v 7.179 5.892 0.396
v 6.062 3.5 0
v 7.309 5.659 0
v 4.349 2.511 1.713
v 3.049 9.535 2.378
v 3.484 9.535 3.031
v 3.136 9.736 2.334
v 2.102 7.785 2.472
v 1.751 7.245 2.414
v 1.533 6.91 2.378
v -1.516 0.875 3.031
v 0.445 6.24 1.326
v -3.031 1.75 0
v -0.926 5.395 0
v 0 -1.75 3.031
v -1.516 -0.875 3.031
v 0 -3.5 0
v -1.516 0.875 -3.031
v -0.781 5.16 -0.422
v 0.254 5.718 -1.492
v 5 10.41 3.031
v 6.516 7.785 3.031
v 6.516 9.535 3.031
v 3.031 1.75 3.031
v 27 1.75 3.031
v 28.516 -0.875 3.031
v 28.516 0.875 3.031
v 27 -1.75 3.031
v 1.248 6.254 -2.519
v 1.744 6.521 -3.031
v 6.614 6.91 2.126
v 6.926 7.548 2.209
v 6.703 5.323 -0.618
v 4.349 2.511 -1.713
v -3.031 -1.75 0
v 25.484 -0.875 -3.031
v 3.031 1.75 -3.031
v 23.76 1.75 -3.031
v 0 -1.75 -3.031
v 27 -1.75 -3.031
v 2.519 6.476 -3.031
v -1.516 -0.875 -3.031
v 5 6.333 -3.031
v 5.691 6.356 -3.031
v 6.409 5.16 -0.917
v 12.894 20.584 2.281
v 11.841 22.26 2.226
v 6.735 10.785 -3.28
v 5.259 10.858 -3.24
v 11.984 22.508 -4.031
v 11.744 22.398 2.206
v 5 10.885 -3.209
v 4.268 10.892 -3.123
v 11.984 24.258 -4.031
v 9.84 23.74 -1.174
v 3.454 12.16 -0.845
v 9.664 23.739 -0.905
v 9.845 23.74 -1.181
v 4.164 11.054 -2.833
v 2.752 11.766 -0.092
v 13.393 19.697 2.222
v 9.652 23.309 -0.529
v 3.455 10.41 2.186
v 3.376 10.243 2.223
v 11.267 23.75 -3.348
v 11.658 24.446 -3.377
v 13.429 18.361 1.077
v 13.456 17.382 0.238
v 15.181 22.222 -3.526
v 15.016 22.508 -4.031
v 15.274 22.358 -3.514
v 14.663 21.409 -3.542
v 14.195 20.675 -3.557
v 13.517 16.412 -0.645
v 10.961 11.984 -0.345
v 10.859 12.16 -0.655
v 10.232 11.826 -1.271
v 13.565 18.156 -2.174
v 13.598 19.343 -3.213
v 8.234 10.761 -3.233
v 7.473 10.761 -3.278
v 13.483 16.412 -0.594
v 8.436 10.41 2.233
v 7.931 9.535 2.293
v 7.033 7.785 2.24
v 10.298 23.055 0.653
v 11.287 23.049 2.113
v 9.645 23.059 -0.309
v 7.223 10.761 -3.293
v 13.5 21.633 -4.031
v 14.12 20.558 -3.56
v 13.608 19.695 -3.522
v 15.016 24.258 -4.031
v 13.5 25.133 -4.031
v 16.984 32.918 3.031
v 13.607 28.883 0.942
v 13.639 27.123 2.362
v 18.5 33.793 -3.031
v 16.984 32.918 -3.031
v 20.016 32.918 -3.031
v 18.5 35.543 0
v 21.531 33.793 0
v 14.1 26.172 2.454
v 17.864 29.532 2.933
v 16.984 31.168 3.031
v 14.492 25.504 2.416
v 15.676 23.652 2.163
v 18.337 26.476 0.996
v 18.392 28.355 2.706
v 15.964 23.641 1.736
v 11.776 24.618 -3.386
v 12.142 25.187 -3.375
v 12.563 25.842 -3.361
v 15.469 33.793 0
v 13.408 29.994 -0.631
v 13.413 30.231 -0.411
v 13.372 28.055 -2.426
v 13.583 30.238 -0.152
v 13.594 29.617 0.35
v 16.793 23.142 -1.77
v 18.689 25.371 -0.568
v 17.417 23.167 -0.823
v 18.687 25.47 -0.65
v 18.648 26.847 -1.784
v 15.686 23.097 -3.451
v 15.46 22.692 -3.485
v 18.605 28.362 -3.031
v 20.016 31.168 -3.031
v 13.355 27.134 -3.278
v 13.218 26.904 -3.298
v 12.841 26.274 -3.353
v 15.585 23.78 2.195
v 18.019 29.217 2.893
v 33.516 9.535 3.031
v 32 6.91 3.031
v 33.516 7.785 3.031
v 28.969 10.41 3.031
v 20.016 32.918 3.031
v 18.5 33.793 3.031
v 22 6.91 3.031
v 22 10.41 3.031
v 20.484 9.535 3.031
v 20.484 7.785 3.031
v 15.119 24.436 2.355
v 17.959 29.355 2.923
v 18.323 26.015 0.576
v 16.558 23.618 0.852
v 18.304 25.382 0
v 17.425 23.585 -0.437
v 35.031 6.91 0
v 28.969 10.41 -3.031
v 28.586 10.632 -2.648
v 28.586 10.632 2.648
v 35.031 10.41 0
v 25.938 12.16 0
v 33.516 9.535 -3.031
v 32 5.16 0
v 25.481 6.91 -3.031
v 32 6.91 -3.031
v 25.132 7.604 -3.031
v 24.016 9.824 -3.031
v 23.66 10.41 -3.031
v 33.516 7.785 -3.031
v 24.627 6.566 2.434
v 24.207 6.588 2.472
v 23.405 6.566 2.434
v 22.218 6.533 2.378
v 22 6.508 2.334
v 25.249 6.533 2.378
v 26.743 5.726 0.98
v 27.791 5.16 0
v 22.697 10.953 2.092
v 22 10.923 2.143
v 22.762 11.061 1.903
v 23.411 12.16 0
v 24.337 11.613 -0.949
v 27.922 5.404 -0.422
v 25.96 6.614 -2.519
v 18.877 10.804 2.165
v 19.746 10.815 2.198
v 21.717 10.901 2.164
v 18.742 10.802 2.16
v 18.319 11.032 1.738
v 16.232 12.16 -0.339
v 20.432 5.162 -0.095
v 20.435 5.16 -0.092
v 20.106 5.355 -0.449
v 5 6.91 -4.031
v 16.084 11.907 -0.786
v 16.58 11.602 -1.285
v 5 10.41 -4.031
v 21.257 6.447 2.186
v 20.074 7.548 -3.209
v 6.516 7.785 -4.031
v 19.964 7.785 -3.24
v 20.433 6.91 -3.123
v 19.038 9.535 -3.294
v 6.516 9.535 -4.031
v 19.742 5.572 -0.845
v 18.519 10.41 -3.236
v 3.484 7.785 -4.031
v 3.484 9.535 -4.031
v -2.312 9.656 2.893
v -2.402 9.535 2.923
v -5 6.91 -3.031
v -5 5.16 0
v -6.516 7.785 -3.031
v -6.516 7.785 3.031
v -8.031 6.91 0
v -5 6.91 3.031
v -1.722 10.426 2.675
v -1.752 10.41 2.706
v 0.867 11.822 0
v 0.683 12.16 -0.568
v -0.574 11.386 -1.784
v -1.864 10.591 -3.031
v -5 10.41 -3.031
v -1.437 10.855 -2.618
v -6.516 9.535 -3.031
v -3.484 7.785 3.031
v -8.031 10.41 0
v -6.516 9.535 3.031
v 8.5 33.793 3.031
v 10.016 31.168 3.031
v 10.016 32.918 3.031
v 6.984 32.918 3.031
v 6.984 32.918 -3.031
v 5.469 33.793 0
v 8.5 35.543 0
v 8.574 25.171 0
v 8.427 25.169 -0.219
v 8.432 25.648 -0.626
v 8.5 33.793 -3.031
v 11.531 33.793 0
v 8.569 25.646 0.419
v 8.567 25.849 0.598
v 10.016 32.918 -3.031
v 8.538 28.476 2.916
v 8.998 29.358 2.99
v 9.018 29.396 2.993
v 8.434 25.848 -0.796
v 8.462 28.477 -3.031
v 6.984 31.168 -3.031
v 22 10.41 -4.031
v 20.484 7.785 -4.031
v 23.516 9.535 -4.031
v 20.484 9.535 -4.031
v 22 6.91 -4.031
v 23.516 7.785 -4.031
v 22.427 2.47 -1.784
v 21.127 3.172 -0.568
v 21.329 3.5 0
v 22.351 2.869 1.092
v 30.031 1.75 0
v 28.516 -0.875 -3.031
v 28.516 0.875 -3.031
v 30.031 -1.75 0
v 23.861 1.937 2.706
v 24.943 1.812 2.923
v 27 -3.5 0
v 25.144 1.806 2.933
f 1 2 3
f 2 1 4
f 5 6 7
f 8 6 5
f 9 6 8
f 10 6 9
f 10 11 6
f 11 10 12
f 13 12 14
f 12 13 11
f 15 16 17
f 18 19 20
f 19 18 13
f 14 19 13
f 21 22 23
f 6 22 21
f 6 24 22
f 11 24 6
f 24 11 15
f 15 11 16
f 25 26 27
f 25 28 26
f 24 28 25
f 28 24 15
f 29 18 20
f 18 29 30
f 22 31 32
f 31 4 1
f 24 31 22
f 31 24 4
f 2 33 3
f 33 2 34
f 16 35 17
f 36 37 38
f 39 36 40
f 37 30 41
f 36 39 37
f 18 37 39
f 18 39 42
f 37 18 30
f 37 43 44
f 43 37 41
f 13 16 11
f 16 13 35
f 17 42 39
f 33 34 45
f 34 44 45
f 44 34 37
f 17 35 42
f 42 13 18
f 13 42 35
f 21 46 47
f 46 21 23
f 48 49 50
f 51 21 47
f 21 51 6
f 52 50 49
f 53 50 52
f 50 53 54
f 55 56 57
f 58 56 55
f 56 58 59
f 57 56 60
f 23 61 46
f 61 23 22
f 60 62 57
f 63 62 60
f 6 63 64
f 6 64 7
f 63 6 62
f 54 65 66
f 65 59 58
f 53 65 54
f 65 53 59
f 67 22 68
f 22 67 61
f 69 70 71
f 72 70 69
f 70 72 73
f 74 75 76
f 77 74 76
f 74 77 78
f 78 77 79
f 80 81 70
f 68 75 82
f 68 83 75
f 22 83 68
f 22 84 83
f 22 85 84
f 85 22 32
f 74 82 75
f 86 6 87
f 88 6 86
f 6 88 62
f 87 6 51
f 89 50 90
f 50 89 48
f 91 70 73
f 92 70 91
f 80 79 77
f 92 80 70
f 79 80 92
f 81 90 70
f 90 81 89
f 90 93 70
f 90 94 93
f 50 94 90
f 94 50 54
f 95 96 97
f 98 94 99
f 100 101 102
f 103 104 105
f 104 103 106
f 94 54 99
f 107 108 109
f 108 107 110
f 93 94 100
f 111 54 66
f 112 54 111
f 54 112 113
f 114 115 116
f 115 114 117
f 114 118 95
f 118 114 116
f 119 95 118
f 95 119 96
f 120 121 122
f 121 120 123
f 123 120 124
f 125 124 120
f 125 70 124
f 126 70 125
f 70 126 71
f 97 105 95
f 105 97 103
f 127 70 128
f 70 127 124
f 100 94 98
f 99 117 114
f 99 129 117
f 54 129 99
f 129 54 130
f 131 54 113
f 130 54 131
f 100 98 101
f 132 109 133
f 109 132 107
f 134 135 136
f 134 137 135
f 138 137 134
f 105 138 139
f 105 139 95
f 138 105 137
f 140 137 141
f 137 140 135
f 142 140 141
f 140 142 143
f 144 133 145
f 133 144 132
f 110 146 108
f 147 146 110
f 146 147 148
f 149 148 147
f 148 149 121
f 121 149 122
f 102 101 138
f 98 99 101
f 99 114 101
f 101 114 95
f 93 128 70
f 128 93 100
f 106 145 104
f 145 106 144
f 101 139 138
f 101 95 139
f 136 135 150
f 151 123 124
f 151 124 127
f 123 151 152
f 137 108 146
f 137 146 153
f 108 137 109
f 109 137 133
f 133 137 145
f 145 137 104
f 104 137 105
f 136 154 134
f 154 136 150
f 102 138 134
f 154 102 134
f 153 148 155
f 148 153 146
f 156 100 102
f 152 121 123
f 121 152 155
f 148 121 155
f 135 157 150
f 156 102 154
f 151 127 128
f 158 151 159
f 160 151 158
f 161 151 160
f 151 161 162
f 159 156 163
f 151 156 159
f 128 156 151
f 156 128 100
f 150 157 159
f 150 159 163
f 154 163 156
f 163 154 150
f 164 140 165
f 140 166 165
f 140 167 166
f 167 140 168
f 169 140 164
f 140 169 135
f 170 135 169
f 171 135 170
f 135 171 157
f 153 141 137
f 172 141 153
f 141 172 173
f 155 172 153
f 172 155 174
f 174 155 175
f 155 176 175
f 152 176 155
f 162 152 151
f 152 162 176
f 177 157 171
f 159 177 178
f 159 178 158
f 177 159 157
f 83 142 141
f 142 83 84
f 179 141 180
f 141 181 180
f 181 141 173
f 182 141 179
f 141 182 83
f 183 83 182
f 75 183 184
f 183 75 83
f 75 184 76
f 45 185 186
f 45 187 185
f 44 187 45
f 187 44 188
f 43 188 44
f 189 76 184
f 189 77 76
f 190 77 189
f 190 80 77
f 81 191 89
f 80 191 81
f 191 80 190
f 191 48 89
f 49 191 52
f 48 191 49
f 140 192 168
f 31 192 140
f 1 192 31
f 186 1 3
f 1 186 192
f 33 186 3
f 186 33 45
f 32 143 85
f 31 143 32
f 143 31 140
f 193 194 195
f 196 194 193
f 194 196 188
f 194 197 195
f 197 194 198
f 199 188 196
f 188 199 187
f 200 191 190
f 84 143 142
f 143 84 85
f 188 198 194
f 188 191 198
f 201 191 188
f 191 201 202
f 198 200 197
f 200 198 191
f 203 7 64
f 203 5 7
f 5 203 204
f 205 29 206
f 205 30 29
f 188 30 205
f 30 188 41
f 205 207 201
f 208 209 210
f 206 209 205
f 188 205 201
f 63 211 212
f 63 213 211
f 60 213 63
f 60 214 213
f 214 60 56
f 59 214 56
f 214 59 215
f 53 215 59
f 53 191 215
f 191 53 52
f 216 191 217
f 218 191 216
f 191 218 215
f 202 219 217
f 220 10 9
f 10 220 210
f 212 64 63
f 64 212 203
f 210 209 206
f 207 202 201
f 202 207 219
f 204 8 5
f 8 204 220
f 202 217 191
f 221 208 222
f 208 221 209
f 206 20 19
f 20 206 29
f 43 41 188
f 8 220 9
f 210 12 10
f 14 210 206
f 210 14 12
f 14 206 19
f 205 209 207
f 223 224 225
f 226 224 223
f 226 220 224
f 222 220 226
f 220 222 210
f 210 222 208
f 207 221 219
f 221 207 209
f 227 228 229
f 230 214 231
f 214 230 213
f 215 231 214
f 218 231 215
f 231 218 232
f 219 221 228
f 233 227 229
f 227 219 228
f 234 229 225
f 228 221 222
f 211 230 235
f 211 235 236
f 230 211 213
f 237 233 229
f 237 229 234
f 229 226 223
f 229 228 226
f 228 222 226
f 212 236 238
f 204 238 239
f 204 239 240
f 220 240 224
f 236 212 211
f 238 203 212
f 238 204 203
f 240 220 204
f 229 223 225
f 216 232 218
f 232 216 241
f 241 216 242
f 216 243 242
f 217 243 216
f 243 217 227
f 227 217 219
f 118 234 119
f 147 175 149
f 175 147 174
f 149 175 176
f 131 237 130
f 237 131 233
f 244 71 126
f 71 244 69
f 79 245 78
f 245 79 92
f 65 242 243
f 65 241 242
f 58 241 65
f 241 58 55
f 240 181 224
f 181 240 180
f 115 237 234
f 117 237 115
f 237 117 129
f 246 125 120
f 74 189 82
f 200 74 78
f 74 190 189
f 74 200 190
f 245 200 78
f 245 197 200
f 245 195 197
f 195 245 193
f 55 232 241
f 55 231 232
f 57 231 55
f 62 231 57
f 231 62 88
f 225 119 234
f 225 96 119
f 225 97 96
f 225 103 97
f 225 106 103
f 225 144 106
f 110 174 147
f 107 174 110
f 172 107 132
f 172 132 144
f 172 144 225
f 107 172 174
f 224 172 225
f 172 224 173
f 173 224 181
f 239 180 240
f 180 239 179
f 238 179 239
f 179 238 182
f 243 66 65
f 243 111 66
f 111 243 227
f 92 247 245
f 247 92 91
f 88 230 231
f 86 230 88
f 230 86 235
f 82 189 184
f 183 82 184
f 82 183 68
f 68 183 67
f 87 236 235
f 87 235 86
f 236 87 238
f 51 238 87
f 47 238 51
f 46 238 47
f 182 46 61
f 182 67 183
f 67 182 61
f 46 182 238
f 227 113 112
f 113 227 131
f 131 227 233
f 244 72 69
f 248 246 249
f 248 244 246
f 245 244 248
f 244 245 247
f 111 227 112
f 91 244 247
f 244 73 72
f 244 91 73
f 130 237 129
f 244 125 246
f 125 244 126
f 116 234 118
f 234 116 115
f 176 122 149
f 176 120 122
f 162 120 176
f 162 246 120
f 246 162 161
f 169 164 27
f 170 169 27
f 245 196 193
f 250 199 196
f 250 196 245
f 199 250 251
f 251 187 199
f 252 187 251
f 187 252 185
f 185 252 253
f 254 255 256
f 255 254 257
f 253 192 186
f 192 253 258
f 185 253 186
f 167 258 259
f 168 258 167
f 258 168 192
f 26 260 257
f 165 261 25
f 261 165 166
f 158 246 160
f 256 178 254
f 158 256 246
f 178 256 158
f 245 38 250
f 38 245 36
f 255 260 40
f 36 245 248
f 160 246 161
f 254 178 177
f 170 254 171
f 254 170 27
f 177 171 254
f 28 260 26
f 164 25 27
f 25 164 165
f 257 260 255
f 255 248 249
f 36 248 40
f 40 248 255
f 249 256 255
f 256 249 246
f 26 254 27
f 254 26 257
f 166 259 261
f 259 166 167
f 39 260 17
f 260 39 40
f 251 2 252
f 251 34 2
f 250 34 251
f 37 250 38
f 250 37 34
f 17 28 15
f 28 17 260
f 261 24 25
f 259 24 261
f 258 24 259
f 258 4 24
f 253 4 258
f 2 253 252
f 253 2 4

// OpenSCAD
scale(v = 10) {
	union() {
		hull() {
			translate(v = [0.0000000000, 0.0, 0]) {
				rotate(a = [0, 0, 30]) {
					sphere($fn = 6, r = 0.3500000000);
				}
			}
			translate(v = [0.5000000000, 0.8660254037844386, 0]) {
				rotate(a = [0, 0, 30]) {
					sphere($fn = 6, r = 0.3500000000);
				}
			}
		}
		hull() {
			translate(v = [0.5000000000, 0.8660254037844386, 0]) {
				rotate(a = [0, 0, 30]) {
					sphere($fn = 6, r = 0.3500000000);
				}
			}
			translate(v = [1.3500000000, 2.3382685902179845, -0.1000000000]) {
				rotate(a = [0, 0, 30]) {
					sphere($fn = 6, r = 0.3500000000);
				}
			}
		}
		hull() {
			translate(v = [1.3500000000, 2.3382685902179845, -0.1000000000]) {
				rotate(a = [0, 0, 30]) {
					sphere($fn = 6, r = 0.3500000000);
				}
			}
			translate(v = [1.8500000000, 3.204293994002423, 0]) {
				rotate(a = [0, 0, 30]) {
					sphere($fn = 6, r = 0.3500000000);
				}
			}
		}
		hull() {
			translate(v = [1.8500000000, 3.204293994002423, 0]) {
				rotate(a = [0, 0, 30]) {
					sphere($fn = 6, r = 0.3500000000);
				}
			}
			translate(v = [3.2000000000, 0.8660254037844386, 0]) {
				rotate(a = [0, 0, 30]) {
					sphere($fn = 6, r = 0.3500000000);
				}
			}
		}
		hull() {
			translate(v = [3.2000000000, 0.8660254037844386, 0]) {
				rotate(a = [0, 0, 30]) {
					sphere($fn = 6, r = 0.3500000000);
				}
			}
			translate(v = [2.2000000000, 0.8660254037844386, 0]) {
				rotate(a = [0, 0, 30]) {
					sphere($fn = 6, r = 0.3500000000);
				}
			}
		}
		hull() {
			translate(v = [2.2000000000, 0.8660254037844386, 0]) {
				rotate(a = [0, 0, 30]) {
					sphere($fn = 6, r = 0.3500000000);
				}
			}
			translate(v = [0.5000000000, 0.8660254037844386, -0.1000000000]) {
				rotate(a = [0, 0, 30]) {
					sphere($fn = 6, r = 0.3500000000);
				}
			}
		}
		hull() {
			translate(v = [0.5000000000, 0.8660254037844386, -0.1000000000]) {
				rotate(a = [0, 0, 30]) {
					sphere($fn = 6, r = 0.3500000000);
				}
			}
			translate(v = [-0.5000000000, 0.8660254037844386, 0]) {
				rotate(a = [0, 0, 30]) {
					sphere($fn = 6, r = 0.3500000000);
				}
			}
		}
		hull() {
			translate(v = [-0.5000000000, 0.8660254037844386, 0]) {
				rotate(a = [0, 0, 30]) {
					sphere($fn = 6, r = 0.3500000000);
				}
			}
			translate(v = [0.8500000000, 3.204293994002423, 0]) {
				rotate(a = [0, 0, 30]) {
					sphere($fn = 6, r = 0.3500000000);
				}
			}
		}
		hull() {
			translate(v = [0.8500000000, 3.204293994002423, 0]) {
				rotate(a = [0, 0, 30]) {
					sphere($fn = 6, r = 0.3500000000);
				}
			}
			translate(v = [2.2000000000, 0.8660254037844386, -0.1000000000]) {
				rotate(a = [0, 0, 30]) {
					sphere($fn = 6, r = 0.3500000000);
				}
			}
		}
		hull() {
			translate(v = [2.2000000000, 0.8660254037844386, -0.1000000000]) {
				rotate(a = [0, 0, 30]) {
					sphere($fn = 6, r = 0.3500000000);
				}
			}
			translate(v = [2.7000000000, 0.0, 0]) {
				rotate(a = [0, 0, 30]) {
					sphere($fn = 6, r = 0.3500000000);
				}
			}
		}
		hull() {
			translate(v = [2.7000000000, 0.0, 0]) {
				rotate(a = [0, 0, 30]) {
					sphere($fn = 6, r = 0.3500000000);
				}
			}
			translate(v = [0.0000000000, 0.0, 0]) {
				rotate(a = [0, 0, 30]) {
					sphere($fn = 6, r = 0.3500000000);
				}
			}
		}
	}
}
